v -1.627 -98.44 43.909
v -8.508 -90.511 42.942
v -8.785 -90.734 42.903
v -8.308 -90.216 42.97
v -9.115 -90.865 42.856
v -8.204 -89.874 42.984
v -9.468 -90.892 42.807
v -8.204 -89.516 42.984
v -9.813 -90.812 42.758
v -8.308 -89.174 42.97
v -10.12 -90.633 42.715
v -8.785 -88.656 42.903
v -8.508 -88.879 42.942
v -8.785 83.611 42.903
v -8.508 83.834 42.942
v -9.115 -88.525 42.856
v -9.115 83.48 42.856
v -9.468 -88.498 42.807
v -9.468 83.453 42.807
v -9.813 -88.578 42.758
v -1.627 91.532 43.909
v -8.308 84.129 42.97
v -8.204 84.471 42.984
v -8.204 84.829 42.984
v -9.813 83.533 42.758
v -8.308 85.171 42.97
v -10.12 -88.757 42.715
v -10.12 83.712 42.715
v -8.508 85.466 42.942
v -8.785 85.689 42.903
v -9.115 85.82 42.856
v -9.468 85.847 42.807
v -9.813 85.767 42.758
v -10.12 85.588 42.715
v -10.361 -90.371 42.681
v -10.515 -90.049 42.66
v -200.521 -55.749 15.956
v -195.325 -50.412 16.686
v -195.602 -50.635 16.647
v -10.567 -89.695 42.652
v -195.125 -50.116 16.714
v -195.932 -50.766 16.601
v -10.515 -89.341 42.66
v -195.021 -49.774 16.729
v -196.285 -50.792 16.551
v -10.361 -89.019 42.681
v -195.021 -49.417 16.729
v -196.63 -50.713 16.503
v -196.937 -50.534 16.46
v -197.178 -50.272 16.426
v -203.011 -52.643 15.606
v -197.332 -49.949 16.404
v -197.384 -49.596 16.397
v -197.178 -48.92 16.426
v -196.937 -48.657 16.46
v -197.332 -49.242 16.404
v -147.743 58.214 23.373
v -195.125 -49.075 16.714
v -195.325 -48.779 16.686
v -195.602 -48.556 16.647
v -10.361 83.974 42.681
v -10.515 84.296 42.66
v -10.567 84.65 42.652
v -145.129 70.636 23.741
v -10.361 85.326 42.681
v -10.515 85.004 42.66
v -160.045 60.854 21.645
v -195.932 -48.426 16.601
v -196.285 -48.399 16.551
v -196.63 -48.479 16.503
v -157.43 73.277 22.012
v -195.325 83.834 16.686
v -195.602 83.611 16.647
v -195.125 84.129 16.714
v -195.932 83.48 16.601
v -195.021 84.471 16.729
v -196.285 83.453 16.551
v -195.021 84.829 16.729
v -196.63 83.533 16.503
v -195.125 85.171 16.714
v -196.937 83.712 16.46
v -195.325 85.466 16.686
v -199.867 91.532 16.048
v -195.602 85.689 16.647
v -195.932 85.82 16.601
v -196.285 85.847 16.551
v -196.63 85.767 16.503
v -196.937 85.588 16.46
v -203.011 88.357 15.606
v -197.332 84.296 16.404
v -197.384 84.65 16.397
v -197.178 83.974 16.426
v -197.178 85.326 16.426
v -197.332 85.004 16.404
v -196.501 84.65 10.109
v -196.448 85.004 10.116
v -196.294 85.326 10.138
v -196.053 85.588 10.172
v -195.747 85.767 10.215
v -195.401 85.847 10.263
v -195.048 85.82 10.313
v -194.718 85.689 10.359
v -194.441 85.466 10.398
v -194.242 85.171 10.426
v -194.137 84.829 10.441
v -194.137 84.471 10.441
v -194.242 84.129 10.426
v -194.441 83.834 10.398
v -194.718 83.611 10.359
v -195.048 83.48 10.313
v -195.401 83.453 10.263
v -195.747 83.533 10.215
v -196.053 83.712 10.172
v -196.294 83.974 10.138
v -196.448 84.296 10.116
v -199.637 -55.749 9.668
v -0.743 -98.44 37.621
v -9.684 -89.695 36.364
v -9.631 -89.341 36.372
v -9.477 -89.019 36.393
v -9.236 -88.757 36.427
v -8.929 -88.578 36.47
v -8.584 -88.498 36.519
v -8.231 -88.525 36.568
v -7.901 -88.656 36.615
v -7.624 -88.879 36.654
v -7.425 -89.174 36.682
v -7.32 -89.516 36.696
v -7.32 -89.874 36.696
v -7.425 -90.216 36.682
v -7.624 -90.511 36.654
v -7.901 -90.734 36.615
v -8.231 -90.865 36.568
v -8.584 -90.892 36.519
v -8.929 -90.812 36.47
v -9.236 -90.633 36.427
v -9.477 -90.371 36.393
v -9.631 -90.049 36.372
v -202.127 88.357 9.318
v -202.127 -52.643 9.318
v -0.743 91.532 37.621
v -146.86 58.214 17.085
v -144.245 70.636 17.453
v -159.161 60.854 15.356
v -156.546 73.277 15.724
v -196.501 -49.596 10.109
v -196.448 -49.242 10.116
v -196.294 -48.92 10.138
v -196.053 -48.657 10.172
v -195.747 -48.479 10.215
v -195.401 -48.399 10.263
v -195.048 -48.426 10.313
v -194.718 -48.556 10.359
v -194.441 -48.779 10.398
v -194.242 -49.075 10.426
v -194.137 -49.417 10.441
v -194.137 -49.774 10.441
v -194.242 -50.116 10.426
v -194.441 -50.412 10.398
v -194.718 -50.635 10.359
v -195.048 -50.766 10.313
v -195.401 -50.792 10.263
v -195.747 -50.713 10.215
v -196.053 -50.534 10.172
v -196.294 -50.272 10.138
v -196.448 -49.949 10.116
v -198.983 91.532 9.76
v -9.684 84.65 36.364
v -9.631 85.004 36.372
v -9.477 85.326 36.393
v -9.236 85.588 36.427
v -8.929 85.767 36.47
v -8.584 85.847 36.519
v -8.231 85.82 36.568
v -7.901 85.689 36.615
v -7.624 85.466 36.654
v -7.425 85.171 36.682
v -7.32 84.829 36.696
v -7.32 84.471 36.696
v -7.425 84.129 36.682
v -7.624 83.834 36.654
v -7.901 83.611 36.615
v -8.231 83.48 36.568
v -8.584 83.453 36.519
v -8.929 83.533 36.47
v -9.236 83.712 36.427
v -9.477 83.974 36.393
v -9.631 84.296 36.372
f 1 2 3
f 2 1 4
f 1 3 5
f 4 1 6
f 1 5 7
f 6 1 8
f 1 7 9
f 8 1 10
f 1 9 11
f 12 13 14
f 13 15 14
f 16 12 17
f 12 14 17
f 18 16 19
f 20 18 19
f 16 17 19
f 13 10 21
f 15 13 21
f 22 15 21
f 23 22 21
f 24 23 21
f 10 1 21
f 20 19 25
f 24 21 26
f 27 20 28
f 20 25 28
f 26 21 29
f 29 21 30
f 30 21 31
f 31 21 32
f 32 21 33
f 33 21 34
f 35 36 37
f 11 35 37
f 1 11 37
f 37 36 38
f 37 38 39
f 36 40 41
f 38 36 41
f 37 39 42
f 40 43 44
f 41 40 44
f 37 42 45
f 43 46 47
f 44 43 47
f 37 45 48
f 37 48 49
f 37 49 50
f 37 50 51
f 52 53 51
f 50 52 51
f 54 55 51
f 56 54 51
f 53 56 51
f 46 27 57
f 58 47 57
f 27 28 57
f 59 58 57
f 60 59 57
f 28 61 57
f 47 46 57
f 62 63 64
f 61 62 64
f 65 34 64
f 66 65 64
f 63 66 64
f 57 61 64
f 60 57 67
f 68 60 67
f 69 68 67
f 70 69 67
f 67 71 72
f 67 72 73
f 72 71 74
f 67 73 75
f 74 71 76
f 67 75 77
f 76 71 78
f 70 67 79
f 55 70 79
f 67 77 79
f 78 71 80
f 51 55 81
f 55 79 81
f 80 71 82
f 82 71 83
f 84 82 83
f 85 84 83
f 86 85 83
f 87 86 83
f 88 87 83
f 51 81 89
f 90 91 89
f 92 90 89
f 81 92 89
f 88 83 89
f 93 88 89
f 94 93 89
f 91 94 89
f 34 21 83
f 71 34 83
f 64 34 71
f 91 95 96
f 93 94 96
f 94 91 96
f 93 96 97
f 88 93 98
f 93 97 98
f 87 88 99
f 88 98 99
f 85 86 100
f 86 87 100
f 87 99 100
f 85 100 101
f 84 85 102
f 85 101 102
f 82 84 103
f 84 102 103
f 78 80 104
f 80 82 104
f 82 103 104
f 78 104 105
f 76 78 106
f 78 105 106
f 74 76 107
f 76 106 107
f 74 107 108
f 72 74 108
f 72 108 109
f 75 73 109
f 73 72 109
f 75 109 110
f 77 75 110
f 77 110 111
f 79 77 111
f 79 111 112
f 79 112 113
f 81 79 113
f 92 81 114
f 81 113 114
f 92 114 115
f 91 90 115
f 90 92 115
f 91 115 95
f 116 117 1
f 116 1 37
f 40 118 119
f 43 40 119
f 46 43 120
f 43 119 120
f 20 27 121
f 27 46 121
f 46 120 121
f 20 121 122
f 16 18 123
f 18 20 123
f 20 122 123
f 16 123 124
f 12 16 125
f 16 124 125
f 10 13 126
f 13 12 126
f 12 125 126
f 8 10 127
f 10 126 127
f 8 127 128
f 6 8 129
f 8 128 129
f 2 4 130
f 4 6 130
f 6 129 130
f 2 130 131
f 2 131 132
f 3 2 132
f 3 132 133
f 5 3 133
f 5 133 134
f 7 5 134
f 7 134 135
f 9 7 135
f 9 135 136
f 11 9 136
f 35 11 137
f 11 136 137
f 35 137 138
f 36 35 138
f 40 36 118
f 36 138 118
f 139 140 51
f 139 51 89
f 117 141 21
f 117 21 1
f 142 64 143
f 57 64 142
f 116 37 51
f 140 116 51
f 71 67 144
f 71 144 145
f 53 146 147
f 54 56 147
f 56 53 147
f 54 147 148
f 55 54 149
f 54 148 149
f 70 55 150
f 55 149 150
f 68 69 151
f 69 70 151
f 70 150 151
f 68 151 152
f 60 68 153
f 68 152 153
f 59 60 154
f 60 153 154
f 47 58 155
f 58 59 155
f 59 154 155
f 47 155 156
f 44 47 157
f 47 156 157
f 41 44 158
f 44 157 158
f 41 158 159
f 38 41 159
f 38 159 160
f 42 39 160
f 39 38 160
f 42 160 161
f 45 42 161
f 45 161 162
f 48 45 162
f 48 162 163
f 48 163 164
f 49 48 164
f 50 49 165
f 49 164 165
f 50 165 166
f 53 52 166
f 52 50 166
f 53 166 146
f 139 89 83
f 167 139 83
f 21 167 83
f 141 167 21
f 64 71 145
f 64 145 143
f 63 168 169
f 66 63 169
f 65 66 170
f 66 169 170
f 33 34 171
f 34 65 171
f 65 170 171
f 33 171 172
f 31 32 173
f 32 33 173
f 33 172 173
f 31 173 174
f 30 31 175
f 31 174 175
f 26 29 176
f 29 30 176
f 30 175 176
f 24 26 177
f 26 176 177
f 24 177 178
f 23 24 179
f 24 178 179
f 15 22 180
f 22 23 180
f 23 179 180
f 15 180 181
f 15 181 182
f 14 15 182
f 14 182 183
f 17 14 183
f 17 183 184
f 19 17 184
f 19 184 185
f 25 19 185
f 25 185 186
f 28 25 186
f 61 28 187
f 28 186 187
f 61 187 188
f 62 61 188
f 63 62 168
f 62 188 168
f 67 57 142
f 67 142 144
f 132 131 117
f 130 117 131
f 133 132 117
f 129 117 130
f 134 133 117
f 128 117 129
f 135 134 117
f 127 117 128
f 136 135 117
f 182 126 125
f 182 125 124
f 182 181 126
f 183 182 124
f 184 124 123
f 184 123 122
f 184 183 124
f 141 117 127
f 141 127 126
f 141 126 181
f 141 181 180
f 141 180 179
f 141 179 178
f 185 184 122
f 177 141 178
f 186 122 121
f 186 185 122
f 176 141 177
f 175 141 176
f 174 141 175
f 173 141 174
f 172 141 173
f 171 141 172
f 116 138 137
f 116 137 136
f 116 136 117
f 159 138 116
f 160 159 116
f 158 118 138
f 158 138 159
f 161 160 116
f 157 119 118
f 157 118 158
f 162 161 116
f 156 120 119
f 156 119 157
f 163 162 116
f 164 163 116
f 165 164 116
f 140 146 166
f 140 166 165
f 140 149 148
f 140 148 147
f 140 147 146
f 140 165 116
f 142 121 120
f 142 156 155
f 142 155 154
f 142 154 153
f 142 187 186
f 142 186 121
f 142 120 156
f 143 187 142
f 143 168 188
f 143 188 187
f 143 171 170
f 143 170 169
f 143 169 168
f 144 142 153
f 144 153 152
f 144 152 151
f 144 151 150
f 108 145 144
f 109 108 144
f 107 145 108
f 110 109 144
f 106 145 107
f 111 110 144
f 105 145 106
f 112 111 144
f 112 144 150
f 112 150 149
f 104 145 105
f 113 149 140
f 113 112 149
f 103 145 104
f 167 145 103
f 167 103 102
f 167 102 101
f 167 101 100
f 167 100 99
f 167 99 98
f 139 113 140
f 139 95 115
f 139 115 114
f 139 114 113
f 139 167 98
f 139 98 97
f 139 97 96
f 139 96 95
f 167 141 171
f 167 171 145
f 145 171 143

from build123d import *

# Parameters (mm, degrees)
EXTRUDE018_DEPTH                          = 25.4
EXTRUDE018_ONTO_SKETCH024_PLACEMENT_ANGLE = 8
SKETCH018_AS_DRAWN_R                      = 1.2
EXTRUDE009_DEPTH                          = 7.8
EXTRUDE009_ONTO_SKETCH018_PLACEMENT_ANGLE = 8
EXTRUDE012_DEPTH                          = 6.35
EXTRUDE012_ONTO_SKETCH021_PLACEMENT_ANGLE = 8


with BuildPart() as reset_switch_hole:
    # Sketch024 as drawn → Extrude018 (new, symmetric)
    with BuildSketch(Plane.XY):
        Polygon((-152.83455, 73.27651), (-140.412076, 70.636031), (-143.052554, 58.213557), (-155.475029, 60.854035), align=None)
    extrude(amount=EXTRUDE018_DEPTH, both=True)


with BuildPart() as reset_switch_hole_1:
    # Extrude018 onto Sketch024 placement: moved
    add(reset_switch_hole.part.moved(Location((-7.384231, 0, 52.541536))).rotate(Axis((-7.384231, 0, 52.541536), (0, -1, 0)), EXTRUDE018_ONTO_SKETCH024_PLACEMENT_ANGLE))


with BuildPart() as screw_hole_cuts:
    # Sketch018 as drawn → Extrude009 (new)
    with BuildSketch(Plane.XY):
        with Locations((-31.998318, 84.649891)):
            Circle(SKETCH018_AS_DRAWN_R)
        with Locations((-31.998318, -89.695043)):
            Circle(SKETCH018_AS_DRAWN_R)
        with Locations((156.654735, -49.595599)):
            Circle(SKETCH018_AS_DRAWN_R)
        with Locations((156.654735, 84.649891)):
            Circle(SKETCH018_AS_DRAWN_R)
    extrude(amount=EXTRUDE009_DEPTH)


with BuildPart() as screw_hole_cuts_1:
    # Extrude009 onto Sketch018 placement: moved
    add(screw_hole_cuts.part.moved(Location((39.98734, 0, 30.691416))).rotate(Axis((39.98734, 0, 30.691416), (0, 1, 0)), EXTRUDE009_ONTO_SKETCH018_PLACEMENT_ANGLE))


with BuildPart() as right_top_solid_w_screw_holes:
    # Sketch021 as drawn → Extrude012 (new)
    with BuildSketch(Plane.XY):
        Polygon((-39.826537, 91.531891), (-39.826537, -98.44048), (161.021837, -55.74884), (163.536735, -52.643218), (163.536735, 88.356895), (160.361736, 91.531891), align=None)
    extrude(amount=EXTRUDE012_DEPTH)


with BuildPart() as right_top_solid_w_screw_holes_1:
    # Extrude012 onto Sketch021 placement: moved
    add(right_top_solid_w_screw_holes.part.moved(Location((40.182182, 0, 32.077791))).rotate(Axis((40.182182, 0, 32.077791), (0, 1, 0)), EXTRUDE012_ONTO_SKETCH021_PLACEMENT_ANGLE))

    # Cut004: cut Screw Hole Cuts
    add(screw_hole_cuts_1.part, mode=Mode.SUBTRACT)


with BuildPart() as cut013:
    # Part__Mirroring002: instance of Right Top Solid w/ Screw Holes
    add(right_top_solid_w_screw_holes_1.part.mirror(Plane(origin=(0, 0, 0), x_dir=(0, -1, 0), z_dir=(1, 0, 0))))

    # Cut013: cut Reset Switch Hole
    add(reset_switch_hole_1.part, mode=Mode.SUBTRACT)


solid = cut013.part
